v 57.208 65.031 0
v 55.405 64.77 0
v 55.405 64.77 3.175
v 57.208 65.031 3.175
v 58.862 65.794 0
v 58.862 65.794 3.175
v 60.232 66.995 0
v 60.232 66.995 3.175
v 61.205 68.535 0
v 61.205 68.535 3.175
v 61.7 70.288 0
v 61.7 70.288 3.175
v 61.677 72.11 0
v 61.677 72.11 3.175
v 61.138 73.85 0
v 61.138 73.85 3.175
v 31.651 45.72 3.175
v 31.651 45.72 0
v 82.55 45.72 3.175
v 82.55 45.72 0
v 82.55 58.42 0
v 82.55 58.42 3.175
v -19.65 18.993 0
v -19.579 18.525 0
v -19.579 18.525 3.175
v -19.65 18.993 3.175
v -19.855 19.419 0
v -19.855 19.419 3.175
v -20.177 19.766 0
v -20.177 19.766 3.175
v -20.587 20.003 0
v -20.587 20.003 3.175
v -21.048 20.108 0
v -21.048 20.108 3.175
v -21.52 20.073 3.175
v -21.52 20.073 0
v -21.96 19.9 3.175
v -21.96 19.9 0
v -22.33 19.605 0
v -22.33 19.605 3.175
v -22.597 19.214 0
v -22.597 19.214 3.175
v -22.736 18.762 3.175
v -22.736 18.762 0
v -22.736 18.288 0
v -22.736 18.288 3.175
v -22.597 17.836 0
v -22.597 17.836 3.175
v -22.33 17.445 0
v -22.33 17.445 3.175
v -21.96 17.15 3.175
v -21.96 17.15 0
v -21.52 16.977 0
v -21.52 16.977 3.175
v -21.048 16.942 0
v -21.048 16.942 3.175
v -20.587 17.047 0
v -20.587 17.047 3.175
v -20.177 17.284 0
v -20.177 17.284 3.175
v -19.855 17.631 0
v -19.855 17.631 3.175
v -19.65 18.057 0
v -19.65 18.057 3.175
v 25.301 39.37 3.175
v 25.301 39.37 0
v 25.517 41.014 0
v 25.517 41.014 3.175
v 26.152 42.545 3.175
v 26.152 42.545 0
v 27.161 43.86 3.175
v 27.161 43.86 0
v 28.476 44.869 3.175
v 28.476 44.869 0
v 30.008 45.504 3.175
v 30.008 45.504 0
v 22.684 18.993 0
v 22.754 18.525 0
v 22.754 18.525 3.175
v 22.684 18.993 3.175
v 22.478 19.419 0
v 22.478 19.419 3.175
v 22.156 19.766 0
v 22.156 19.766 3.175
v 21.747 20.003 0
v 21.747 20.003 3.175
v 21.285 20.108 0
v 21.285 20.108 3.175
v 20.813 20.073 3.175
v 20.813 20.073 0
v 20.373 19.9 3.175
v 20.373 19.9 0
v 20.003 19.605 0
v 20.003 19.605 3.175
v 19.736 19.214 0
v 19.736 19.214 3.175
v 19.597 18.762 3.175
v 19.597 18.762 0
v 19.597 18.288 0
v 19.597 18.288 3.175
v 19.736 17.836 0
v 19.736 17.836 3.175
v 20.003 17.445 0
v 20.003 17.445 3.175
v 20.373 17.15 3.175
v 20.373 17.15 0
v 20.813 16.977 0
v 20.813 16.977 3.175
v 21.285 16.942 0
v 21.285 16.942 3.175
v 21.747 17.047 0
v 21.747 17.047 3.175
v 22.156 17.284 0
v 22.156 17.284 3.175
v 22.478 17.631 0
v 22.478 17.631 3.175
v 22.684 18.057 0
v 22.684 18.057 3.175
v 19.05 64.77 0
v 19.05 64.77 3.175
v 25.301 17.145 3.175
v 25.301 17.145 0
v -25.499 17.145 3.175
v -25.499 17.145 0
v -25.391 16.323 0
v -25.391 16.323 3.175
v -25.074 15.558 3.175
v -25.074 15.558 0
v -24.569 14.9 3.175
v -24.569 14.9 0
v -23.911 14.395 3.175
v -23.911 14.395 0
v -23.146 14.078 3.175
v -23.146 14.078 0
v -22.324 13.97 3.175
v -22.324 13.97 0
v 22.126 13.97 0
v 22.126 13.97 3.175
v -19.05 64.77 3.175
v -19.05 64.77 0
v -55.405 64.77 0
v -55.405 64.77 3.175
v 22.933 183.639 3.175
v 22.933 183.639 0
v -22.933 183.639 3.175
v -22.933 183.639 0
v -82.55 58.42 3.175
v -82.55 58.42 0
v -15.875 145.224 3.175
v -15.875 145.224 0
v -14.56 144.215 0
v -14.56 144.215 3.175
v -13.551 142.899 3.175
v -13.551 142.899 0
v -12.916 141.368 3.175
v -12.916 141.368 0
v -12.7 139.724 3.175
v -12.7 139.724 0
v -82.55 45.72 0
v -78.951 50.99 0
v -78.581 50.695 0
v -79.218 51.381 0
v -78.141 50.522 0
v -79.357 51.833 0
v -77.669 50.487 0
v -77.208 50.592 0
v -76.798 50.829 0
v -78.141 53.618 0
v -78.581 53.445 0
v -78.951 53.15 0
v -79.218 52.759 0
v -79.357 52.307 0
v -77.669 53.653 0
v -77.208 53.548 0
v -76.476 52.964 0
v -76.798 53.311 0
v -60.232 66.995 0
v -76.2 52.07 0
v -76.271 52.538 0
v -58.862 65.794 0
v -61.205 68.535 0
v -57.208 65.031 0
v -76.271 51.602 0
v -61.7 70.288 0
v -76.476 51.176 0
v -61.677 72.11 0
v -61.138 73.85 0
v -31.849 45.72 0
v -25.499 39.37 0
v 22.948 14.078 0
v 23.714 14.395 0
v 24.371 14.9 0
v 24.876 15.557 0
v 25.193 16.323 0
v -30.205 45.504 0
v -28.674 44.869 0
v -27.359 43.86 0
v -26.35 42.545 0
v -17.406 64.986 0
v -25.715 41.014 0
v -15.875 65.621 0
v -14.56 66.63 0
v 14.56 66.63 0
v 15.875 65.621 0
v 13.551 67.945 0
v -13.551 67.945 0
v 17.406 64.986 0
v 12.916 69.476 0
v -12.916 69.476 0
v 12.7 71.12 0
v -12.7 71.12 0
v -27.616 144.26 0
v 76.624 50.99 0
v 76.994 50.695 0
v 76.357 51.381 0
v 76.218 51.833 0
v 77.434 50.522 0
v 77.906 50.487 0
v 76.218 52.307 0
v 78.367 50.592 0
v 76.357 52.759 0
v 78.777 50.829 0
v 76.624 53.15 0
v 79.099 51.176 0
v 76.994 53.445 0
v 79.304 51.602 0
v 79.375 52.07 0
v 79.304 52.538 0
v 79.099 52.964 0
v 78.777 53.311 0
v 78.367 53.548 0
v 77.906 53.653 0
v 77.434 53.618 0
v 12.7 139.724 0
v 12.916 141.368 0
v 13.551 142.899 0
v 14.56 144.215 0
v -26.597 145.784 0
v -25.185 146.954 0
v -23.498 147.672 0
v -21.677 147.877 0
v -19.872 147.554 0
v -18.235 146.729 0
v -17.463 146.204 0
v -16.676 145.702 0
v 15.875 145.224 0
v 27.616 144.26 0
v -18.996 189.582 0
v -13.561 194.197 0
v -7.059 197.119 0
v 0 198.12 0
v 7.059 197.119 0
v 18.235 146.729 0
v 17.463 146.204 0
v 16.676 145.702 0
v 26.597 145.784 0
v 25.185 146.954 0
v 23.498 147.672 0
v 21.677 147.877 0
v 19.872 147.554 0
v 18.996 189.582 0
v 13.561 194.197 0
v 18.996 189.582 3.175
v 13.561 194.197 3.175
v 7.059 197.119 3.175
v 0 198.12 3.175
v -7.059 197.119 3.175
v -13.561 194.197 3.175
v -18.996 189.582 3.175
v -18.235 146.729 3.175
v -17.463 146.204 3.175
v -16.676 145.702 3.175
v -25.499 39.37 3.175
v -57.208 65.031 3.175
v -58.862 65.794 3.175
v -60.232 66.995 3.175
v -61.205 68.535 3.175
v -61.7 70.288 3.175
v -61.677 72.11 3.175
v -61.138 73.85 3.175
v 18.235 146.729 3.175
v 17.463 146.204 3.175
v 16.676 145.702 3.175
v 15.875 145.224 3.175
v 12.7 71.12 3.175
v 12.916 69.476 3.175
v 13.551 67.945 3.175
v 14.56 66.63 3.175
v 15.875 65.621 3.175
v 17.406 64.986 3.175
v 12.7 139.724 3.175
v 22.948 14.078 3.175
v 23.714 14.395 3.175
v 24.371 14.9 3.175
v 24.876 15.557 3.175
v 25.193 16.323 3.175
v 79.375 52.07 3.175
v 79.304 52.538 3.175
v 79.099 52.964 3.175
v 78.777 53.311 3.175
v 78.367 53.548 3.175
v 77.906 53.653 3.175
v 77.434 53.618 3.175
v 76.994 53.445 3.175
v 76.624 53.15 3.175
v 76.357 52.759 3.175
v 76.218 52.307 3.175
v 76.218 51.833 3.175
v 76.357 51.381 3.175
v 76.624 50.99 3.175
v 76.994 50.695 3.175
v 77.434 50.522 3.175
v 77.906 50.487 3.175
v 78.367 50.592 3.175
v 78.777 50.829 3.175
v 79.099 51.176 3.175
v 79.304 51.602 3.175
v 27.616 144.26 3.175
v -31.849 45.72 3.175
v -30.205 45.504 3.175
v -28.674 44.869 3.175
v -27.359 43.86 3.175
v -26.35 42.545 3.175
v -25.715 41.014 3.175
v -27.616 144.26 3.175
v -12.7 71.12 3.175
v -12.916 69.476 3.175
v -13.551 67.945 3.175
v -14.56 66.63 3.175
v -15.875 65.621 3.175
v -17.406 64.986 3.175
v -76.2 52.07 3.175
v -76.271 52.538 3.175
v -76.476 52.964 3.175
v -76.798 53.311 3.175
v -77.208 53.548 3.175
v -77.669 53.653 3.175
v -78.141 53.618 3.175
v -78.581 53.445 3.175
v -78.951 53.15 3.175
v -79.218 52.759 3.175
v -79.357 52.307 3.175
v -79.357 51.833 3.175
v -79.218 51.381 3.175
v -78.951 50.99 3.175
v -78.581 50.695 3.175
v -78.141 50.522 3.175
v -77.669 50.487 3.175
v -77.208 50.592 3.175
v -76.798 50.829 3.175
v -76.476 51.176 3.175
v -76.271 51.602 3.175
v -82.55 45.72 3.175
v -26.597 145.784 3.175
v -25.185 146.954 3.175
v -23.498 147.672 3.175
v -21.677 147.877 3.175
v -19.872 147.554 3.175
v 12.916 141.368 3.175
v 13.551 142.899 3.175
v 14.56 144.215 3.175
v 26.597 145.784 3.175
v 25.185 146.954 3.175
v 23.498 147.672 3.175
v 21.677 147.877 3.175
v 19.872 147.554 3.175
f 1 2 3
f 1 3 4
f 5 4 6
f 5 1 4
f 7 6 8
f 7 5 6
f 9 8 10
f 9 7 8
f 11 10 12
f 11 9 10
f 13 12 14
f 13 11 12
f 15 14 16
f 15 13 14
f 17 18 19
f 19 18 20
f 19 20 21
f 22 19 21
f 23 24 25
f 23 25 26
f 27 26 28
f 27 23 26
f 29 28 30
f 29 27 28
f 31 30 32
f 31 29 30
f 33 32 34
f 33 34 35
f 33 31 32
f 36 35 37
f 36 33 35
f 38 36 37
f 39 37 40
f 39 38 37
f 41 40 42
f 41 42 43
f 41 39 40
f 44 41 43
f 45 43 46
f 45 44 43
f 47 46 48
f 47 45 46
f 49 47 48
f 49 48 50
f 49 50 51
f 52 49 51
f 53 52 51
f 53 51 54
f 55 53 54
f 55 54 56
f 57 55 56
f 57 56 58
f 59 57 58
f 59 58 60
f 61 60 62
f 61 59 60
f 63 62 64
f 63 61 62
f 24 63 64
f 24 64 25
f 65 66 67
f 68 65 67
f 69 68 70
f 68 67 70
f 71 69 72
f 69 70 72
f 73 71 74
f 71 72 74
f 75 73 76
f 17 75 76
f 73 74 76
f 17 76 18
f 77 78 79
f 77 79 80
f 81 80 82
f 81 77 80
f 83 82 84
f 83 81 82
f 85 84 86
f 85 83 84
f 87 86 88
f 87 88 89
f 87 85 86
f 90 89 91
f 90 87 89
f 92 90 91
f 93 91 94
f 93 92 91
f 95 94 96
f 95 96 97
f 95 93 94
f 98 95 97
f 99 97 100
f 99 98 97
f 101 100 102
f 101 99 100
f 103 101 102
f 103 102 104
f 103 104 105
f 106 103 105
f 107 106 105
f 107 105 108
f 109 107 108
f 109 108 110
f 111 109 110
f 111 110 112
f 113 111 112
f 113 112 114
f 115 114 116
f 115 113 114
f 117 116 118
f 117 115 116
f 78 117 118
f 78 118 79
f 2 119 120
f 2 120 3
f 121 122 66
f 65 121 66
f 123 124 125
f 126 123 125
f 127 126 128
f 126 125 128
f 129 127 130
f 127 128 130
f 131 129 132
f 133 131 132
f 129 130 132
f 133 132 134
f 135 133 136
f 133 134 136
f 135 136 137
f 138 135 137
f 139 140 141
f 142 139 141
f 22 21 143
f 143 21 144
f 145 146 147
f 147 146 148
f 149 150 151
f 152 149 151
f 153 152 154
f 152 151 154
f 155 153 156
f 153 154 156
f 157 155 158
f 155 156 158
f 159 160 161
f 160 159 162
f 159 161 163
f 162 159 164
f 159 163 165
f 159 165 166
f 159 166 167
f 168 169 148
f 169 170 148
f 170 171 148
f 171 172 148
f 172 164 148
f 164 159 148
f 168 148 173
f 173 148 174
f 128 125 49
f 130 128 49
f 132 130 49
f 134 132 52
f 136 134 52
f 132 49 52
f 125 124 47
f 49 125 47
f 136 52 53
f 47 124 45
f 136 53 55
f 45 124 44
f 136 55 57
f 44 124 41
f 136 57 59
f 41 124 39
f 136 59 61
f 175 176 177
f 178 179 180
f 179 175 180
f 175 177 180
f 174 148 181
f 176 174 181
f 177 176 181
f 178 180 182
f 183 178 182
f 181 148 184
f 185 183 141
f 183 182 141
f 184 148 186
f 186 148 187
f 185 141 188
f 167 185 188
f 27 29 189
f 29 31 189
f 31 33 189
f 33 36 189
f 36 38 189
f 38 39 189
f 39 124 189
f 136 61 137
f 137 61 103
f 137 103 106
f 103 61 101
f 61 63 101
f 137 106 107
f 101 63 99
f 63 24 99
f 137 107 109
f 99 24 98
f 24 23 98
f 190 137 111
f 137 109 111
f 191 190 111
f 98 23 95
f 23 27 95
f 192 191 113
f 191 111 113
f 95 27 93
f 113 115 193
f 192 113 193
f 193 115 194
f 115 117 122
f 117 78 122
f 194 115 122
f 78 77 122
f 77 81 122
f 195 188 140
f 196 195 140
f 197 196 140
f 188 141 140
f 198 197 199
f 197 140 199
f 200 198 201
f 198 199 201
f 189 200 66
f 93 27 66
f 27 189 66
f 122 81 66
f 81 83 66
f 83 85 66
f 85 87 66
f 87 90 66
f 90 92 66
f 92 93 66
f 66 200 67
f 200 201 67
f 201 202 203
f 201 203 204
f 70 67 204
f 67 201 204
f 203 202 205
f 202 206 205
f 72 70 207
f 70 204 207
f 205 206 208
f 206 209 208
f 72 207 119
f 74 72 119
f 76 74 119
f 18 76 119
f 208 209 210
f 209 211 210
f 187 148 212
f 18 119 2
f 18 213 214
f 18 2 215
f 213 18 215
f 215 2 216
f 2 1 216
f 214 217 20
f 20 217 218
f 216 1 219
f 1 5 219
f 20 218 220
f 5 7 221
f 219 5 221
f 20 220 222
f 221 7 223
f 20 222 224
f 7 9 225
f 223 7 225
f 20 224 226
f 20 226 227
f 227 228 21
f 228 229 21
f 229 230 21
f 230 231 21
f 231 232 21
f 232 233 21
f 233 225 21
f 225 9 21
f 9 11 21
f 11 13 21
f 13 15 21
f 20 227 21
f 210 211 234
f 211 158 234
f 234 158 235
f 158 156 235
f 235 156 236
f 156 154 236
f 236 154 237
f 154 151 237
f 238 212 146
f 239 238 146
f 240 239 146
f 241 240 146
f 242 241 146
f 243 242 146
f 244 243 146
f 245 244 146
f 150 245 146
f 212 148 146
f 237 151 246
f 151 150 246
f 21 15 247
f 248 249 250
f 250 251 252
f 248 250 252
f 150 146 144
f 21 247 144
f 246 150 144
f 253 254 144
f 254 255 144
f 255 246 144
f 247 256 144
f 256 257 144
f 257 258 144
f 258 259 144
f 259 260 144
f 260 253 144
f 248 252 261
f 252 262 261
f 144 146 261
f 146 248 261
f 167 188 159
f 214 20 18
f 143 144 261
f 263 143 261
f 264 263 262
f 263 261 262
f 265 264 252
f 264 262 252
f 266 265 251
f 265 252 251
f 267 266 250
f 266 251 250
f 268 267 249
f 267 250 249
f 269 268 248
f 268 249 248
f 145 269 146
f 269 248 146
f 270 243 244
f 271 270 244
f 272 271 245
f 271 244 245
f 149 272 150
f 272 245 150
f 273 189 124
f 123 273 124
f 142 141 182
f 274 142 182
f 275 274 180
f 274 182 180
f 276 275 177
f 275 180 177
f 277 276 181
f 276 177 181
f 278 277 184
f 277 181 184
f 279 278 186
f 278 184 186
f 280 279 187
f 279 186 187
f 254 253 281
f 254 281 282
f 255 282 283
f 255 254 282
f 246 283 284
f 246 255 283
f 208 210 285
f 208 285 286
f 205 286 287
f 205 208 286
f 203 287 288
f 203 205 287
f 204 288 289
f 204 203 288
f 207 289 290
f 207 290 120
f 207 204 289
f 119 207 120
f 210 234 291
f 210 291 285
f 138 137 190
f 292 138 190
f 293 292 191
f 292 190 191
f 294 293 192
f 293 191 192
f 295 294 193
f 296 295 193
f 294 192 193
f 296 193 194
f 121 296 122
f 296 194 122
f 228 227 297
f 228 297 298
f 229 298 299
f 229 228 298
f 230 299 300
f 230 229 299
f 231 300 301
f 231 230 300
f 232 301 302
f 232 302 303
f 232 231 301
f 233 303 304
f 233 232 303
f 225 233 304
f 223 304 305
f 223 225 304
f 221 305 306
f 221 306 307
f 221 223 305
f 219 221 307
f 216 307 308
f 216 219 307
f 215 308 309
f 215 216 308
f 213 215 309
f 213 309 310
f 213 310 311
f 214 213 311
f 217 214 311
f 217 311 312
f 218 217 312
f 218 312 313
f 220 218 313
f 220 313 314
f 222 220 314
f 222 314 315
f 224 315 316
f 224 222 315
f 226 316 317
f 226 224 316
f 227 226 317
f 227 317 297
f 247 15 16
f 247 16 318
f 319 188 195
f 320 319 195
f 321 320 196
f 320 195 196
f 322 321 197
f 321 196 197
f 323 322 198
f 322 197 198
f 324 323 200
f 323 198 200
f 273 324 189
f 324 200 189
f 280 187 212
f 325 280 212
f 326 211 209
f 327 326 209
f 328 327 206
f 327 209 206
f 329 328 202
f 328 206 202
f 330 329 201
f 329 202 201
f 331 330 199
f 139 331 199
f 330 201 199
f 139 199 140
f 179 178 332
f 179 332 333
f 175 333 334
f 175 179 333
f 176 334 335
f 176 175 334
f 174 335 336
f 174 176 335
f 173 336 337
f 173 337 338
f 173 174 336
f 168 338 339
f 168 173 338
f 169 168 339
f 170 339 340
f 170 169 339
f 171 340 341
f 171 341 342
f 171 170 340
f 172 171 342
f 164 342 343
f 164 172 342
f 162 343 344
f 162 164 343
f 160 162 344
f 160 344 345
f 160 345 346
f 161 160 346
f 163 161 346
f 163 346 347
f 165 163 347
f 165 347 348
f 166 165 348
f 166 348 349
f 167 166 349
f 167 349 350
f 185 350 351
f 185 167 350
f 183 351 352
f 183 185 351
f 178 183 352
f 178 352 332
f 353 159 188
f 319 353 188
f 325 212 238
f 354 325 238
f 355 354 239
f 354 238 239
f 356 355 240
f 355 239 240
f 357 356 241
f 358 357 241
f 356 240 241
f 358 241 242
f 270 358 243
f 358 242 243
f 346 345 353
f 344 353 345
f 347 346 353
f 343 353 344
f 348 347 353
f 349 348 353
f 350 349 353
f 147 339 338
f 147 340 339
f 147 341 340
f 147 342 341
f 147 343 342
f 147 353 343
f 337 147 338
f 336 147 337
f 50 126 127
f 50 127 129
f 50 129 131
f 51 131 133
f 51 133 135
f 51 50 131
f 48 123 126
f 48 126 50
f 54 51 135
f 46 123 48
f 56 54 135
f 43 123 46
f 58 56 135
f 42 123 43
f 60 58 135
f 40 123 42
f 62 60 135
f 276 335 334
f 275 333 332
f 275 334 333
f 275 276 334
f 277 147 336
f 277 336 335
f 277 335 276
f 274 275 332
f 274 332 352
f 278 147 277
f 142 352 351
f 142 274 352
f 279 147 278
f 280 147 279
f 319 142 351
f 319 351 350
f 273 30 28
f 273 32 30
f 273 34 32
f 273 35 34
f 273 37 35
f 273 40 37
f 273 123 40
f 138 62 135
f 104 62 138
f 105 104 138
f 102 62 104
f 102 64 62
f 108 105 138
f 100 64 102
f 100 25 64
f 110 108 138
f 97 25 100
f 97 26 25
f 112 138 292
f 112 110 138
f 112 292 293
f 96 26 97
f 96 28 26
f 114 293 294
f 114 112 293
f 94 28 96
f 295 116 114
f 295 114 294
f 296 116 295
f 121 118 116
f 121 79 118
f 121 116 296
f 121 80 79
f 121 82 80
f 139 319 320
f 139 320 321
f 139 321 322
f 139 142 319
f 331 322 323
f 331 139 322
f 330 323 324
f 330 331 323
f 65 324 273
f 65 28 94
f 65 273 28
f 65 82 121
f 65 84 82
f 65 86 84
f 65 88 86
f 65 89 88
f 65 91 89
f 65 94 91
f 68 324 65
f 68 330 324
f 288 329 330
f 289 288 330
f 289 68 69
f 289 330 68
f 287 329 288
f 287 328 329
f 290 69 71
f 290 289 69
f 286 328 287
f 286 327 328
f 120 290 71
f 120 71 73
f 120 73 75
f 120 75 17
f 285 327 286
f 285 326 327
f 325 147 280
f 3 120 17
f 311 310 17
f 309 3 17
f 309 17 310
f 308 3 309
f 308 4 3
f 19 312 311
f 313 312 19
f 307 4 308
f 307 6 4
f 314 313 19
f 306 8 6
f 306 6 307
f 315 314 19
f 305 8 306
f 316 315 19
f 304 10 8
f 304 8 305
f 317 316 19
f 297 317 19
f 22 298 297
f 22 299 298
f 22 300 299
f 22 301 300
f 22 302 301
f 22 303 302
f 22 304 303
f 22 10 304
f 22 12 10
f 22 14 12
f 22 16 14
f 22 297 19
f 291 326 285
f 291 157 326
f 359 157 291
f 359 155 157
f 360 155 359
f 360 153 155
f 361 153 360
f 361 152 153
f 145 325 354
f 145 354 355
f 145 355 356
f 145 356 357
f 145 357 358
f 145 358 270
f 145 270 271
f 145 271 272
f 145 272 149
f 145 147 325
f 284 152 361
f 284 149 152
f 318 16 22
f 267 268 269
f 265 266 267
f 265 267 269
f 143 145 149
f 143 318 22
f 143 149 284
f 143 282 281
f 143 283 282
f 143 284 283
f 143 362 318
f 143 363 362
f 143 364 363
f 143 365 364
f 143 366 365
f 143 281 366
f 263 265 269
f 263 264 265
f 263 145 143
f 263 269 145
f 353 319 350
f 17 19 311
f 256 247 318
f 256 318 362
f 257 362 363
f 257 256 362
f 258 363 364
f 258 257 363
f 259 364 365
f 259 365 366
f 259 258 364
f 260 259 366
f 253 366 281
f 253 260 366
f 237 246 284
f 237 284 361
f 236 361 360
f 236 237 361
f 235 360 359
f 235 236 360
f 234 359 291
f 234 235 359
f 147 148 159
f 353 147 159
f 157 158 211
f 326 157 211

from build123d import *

# Parameters (mm, degrees)
SKETCH5_R           = 1.5875
BOSS_EXTRUDE2_DEPTH = 3.175


with BuildPart() as part:
    # Sketch5 → Boss-Extrude2 (new body)
    with BuildSketch(Plane.XY):
        with BuildLine():
            Line((-82.55, 58.42), (-82.55, 45.72))
            Line((-82.55, 45.72), (-31.848963051, 45.72))
            ThreePointArc((-31.848963051, 45.72), (-27.35883499, 43.860128061), (-25.498963051, 39.37))
            Line((-25.498963051, 39.37), (-25.498963051, 17.145))
            ThreePointArc((-25.498963051, 17.145), (-24.569027081, 14.89993597), (-22.323963051, 13.97))
            Line((-22.323963051, 13.97), (22.126036949, 13.97))
            ThreePointArc((22.126036949, 13.97), (24.37110098, 14.89993597), (25.301036949, 17.145))
            Line((25.301036949, 17.145), (25.301036949, 39.37))
            ThreePointArc((25.301036949, 39.37), (27.160908889, 43.860128061), (31.651036949, 45.72))
            Line((31.651036949, 45.72), (82.55, 45.72))
            Line((82.55, 45.72), (82.55, 58.42))
            Line((82.55, 58.42), (22.933465972, 183.638614313))
            ThreePointArc((22.933465972, 183.638614313), (0, 198.12), (-22.933465972, 183.638614313))
            Line((-22.933465972, 183.638614313), (-82.55, 58.42))
        make_face()
        with Locations((21.166666667, 18.525000034)):
            Circle(SKETCH5_R, mode=Mode.SUBTRACT)
        with Locations((-21.166666667, 18.525000034)):
            Circle(SKETCH5_R, mode=Mode.SUBTRACT)
        with Locations((-77.7875, 52.07)):
            Circle(SKETCH5_R, mode=Mode.SUBTRACT)
        with Locations((77.7875, 52.07)):
            Circle(SKETCH5_R, mode=Mode.SUBTRACT)
        with BuildLine():
            Line((-61.138040857, 73.849653578), (-27.615581335, 144.260253558))
            ThreePointArc((-27.615581335, 144.260253558), (-23.498279642, 147.671514779), (-18.235179035, 146.728833317))
            ThreePointArc((-18.235179035, 146.728833317), (-17.071685329, 145.950239821), (-15.875, 145.22369343))
            ThreePointArc((-15.875, 145.22369343), (-13.550738686, 142.899432116), (-12.7, 139.724432116))
            Line((-12.7, 139.724432116), (-12.7, 71.12))
            ThreePointArc((-12.7, 71.12), (-14.559871939, 66.629871939), (-19.05, 64.77))
            Line((-19.05, 64.77), (-55.404674364, 64.77))
            ThreePointArc((-55.404674364, 64.77), (-60.77383632, 67.729631305), (-61.138040857, 73.849653578))
        make_face(mode=Mode.SUBTRACT)
        with BuildLine():
            Line((61.138040857, 73.849653578), (27.615581335, 144.260253558))
            ThreePointArc((27.615581335, 144.260253558), (23.498279642, 147.671514779), (18.235179035, 146.728833317))
            ThreePointArc((18.235179035, 146.728833317), (17.071685329, 145.950239821), (15.875, 145.22369343))
            ThreePointArc((15.875, 145.22369343), (13.550738686, 142.899432116), (12.7, 139.724432116))
            Line((12.7, 139.724432116), (12.7, 71.12))
            ThreePointArc((12.7, 71.12), (14.559871939, 66.629871939), (19.05, 64.77))
            Line((19.05, 64.77), (55.404674364, 64.77))
            ThreePointArc((55.404674364, 64.77), (60.77383632, 67.729631305), (61.138040857, 73.849653578))
        make_face(mode=Mode.SUBTRACT)
    extrude(amount=BOSS_EXTRUDE2_DEPTH)


solid = part.part
